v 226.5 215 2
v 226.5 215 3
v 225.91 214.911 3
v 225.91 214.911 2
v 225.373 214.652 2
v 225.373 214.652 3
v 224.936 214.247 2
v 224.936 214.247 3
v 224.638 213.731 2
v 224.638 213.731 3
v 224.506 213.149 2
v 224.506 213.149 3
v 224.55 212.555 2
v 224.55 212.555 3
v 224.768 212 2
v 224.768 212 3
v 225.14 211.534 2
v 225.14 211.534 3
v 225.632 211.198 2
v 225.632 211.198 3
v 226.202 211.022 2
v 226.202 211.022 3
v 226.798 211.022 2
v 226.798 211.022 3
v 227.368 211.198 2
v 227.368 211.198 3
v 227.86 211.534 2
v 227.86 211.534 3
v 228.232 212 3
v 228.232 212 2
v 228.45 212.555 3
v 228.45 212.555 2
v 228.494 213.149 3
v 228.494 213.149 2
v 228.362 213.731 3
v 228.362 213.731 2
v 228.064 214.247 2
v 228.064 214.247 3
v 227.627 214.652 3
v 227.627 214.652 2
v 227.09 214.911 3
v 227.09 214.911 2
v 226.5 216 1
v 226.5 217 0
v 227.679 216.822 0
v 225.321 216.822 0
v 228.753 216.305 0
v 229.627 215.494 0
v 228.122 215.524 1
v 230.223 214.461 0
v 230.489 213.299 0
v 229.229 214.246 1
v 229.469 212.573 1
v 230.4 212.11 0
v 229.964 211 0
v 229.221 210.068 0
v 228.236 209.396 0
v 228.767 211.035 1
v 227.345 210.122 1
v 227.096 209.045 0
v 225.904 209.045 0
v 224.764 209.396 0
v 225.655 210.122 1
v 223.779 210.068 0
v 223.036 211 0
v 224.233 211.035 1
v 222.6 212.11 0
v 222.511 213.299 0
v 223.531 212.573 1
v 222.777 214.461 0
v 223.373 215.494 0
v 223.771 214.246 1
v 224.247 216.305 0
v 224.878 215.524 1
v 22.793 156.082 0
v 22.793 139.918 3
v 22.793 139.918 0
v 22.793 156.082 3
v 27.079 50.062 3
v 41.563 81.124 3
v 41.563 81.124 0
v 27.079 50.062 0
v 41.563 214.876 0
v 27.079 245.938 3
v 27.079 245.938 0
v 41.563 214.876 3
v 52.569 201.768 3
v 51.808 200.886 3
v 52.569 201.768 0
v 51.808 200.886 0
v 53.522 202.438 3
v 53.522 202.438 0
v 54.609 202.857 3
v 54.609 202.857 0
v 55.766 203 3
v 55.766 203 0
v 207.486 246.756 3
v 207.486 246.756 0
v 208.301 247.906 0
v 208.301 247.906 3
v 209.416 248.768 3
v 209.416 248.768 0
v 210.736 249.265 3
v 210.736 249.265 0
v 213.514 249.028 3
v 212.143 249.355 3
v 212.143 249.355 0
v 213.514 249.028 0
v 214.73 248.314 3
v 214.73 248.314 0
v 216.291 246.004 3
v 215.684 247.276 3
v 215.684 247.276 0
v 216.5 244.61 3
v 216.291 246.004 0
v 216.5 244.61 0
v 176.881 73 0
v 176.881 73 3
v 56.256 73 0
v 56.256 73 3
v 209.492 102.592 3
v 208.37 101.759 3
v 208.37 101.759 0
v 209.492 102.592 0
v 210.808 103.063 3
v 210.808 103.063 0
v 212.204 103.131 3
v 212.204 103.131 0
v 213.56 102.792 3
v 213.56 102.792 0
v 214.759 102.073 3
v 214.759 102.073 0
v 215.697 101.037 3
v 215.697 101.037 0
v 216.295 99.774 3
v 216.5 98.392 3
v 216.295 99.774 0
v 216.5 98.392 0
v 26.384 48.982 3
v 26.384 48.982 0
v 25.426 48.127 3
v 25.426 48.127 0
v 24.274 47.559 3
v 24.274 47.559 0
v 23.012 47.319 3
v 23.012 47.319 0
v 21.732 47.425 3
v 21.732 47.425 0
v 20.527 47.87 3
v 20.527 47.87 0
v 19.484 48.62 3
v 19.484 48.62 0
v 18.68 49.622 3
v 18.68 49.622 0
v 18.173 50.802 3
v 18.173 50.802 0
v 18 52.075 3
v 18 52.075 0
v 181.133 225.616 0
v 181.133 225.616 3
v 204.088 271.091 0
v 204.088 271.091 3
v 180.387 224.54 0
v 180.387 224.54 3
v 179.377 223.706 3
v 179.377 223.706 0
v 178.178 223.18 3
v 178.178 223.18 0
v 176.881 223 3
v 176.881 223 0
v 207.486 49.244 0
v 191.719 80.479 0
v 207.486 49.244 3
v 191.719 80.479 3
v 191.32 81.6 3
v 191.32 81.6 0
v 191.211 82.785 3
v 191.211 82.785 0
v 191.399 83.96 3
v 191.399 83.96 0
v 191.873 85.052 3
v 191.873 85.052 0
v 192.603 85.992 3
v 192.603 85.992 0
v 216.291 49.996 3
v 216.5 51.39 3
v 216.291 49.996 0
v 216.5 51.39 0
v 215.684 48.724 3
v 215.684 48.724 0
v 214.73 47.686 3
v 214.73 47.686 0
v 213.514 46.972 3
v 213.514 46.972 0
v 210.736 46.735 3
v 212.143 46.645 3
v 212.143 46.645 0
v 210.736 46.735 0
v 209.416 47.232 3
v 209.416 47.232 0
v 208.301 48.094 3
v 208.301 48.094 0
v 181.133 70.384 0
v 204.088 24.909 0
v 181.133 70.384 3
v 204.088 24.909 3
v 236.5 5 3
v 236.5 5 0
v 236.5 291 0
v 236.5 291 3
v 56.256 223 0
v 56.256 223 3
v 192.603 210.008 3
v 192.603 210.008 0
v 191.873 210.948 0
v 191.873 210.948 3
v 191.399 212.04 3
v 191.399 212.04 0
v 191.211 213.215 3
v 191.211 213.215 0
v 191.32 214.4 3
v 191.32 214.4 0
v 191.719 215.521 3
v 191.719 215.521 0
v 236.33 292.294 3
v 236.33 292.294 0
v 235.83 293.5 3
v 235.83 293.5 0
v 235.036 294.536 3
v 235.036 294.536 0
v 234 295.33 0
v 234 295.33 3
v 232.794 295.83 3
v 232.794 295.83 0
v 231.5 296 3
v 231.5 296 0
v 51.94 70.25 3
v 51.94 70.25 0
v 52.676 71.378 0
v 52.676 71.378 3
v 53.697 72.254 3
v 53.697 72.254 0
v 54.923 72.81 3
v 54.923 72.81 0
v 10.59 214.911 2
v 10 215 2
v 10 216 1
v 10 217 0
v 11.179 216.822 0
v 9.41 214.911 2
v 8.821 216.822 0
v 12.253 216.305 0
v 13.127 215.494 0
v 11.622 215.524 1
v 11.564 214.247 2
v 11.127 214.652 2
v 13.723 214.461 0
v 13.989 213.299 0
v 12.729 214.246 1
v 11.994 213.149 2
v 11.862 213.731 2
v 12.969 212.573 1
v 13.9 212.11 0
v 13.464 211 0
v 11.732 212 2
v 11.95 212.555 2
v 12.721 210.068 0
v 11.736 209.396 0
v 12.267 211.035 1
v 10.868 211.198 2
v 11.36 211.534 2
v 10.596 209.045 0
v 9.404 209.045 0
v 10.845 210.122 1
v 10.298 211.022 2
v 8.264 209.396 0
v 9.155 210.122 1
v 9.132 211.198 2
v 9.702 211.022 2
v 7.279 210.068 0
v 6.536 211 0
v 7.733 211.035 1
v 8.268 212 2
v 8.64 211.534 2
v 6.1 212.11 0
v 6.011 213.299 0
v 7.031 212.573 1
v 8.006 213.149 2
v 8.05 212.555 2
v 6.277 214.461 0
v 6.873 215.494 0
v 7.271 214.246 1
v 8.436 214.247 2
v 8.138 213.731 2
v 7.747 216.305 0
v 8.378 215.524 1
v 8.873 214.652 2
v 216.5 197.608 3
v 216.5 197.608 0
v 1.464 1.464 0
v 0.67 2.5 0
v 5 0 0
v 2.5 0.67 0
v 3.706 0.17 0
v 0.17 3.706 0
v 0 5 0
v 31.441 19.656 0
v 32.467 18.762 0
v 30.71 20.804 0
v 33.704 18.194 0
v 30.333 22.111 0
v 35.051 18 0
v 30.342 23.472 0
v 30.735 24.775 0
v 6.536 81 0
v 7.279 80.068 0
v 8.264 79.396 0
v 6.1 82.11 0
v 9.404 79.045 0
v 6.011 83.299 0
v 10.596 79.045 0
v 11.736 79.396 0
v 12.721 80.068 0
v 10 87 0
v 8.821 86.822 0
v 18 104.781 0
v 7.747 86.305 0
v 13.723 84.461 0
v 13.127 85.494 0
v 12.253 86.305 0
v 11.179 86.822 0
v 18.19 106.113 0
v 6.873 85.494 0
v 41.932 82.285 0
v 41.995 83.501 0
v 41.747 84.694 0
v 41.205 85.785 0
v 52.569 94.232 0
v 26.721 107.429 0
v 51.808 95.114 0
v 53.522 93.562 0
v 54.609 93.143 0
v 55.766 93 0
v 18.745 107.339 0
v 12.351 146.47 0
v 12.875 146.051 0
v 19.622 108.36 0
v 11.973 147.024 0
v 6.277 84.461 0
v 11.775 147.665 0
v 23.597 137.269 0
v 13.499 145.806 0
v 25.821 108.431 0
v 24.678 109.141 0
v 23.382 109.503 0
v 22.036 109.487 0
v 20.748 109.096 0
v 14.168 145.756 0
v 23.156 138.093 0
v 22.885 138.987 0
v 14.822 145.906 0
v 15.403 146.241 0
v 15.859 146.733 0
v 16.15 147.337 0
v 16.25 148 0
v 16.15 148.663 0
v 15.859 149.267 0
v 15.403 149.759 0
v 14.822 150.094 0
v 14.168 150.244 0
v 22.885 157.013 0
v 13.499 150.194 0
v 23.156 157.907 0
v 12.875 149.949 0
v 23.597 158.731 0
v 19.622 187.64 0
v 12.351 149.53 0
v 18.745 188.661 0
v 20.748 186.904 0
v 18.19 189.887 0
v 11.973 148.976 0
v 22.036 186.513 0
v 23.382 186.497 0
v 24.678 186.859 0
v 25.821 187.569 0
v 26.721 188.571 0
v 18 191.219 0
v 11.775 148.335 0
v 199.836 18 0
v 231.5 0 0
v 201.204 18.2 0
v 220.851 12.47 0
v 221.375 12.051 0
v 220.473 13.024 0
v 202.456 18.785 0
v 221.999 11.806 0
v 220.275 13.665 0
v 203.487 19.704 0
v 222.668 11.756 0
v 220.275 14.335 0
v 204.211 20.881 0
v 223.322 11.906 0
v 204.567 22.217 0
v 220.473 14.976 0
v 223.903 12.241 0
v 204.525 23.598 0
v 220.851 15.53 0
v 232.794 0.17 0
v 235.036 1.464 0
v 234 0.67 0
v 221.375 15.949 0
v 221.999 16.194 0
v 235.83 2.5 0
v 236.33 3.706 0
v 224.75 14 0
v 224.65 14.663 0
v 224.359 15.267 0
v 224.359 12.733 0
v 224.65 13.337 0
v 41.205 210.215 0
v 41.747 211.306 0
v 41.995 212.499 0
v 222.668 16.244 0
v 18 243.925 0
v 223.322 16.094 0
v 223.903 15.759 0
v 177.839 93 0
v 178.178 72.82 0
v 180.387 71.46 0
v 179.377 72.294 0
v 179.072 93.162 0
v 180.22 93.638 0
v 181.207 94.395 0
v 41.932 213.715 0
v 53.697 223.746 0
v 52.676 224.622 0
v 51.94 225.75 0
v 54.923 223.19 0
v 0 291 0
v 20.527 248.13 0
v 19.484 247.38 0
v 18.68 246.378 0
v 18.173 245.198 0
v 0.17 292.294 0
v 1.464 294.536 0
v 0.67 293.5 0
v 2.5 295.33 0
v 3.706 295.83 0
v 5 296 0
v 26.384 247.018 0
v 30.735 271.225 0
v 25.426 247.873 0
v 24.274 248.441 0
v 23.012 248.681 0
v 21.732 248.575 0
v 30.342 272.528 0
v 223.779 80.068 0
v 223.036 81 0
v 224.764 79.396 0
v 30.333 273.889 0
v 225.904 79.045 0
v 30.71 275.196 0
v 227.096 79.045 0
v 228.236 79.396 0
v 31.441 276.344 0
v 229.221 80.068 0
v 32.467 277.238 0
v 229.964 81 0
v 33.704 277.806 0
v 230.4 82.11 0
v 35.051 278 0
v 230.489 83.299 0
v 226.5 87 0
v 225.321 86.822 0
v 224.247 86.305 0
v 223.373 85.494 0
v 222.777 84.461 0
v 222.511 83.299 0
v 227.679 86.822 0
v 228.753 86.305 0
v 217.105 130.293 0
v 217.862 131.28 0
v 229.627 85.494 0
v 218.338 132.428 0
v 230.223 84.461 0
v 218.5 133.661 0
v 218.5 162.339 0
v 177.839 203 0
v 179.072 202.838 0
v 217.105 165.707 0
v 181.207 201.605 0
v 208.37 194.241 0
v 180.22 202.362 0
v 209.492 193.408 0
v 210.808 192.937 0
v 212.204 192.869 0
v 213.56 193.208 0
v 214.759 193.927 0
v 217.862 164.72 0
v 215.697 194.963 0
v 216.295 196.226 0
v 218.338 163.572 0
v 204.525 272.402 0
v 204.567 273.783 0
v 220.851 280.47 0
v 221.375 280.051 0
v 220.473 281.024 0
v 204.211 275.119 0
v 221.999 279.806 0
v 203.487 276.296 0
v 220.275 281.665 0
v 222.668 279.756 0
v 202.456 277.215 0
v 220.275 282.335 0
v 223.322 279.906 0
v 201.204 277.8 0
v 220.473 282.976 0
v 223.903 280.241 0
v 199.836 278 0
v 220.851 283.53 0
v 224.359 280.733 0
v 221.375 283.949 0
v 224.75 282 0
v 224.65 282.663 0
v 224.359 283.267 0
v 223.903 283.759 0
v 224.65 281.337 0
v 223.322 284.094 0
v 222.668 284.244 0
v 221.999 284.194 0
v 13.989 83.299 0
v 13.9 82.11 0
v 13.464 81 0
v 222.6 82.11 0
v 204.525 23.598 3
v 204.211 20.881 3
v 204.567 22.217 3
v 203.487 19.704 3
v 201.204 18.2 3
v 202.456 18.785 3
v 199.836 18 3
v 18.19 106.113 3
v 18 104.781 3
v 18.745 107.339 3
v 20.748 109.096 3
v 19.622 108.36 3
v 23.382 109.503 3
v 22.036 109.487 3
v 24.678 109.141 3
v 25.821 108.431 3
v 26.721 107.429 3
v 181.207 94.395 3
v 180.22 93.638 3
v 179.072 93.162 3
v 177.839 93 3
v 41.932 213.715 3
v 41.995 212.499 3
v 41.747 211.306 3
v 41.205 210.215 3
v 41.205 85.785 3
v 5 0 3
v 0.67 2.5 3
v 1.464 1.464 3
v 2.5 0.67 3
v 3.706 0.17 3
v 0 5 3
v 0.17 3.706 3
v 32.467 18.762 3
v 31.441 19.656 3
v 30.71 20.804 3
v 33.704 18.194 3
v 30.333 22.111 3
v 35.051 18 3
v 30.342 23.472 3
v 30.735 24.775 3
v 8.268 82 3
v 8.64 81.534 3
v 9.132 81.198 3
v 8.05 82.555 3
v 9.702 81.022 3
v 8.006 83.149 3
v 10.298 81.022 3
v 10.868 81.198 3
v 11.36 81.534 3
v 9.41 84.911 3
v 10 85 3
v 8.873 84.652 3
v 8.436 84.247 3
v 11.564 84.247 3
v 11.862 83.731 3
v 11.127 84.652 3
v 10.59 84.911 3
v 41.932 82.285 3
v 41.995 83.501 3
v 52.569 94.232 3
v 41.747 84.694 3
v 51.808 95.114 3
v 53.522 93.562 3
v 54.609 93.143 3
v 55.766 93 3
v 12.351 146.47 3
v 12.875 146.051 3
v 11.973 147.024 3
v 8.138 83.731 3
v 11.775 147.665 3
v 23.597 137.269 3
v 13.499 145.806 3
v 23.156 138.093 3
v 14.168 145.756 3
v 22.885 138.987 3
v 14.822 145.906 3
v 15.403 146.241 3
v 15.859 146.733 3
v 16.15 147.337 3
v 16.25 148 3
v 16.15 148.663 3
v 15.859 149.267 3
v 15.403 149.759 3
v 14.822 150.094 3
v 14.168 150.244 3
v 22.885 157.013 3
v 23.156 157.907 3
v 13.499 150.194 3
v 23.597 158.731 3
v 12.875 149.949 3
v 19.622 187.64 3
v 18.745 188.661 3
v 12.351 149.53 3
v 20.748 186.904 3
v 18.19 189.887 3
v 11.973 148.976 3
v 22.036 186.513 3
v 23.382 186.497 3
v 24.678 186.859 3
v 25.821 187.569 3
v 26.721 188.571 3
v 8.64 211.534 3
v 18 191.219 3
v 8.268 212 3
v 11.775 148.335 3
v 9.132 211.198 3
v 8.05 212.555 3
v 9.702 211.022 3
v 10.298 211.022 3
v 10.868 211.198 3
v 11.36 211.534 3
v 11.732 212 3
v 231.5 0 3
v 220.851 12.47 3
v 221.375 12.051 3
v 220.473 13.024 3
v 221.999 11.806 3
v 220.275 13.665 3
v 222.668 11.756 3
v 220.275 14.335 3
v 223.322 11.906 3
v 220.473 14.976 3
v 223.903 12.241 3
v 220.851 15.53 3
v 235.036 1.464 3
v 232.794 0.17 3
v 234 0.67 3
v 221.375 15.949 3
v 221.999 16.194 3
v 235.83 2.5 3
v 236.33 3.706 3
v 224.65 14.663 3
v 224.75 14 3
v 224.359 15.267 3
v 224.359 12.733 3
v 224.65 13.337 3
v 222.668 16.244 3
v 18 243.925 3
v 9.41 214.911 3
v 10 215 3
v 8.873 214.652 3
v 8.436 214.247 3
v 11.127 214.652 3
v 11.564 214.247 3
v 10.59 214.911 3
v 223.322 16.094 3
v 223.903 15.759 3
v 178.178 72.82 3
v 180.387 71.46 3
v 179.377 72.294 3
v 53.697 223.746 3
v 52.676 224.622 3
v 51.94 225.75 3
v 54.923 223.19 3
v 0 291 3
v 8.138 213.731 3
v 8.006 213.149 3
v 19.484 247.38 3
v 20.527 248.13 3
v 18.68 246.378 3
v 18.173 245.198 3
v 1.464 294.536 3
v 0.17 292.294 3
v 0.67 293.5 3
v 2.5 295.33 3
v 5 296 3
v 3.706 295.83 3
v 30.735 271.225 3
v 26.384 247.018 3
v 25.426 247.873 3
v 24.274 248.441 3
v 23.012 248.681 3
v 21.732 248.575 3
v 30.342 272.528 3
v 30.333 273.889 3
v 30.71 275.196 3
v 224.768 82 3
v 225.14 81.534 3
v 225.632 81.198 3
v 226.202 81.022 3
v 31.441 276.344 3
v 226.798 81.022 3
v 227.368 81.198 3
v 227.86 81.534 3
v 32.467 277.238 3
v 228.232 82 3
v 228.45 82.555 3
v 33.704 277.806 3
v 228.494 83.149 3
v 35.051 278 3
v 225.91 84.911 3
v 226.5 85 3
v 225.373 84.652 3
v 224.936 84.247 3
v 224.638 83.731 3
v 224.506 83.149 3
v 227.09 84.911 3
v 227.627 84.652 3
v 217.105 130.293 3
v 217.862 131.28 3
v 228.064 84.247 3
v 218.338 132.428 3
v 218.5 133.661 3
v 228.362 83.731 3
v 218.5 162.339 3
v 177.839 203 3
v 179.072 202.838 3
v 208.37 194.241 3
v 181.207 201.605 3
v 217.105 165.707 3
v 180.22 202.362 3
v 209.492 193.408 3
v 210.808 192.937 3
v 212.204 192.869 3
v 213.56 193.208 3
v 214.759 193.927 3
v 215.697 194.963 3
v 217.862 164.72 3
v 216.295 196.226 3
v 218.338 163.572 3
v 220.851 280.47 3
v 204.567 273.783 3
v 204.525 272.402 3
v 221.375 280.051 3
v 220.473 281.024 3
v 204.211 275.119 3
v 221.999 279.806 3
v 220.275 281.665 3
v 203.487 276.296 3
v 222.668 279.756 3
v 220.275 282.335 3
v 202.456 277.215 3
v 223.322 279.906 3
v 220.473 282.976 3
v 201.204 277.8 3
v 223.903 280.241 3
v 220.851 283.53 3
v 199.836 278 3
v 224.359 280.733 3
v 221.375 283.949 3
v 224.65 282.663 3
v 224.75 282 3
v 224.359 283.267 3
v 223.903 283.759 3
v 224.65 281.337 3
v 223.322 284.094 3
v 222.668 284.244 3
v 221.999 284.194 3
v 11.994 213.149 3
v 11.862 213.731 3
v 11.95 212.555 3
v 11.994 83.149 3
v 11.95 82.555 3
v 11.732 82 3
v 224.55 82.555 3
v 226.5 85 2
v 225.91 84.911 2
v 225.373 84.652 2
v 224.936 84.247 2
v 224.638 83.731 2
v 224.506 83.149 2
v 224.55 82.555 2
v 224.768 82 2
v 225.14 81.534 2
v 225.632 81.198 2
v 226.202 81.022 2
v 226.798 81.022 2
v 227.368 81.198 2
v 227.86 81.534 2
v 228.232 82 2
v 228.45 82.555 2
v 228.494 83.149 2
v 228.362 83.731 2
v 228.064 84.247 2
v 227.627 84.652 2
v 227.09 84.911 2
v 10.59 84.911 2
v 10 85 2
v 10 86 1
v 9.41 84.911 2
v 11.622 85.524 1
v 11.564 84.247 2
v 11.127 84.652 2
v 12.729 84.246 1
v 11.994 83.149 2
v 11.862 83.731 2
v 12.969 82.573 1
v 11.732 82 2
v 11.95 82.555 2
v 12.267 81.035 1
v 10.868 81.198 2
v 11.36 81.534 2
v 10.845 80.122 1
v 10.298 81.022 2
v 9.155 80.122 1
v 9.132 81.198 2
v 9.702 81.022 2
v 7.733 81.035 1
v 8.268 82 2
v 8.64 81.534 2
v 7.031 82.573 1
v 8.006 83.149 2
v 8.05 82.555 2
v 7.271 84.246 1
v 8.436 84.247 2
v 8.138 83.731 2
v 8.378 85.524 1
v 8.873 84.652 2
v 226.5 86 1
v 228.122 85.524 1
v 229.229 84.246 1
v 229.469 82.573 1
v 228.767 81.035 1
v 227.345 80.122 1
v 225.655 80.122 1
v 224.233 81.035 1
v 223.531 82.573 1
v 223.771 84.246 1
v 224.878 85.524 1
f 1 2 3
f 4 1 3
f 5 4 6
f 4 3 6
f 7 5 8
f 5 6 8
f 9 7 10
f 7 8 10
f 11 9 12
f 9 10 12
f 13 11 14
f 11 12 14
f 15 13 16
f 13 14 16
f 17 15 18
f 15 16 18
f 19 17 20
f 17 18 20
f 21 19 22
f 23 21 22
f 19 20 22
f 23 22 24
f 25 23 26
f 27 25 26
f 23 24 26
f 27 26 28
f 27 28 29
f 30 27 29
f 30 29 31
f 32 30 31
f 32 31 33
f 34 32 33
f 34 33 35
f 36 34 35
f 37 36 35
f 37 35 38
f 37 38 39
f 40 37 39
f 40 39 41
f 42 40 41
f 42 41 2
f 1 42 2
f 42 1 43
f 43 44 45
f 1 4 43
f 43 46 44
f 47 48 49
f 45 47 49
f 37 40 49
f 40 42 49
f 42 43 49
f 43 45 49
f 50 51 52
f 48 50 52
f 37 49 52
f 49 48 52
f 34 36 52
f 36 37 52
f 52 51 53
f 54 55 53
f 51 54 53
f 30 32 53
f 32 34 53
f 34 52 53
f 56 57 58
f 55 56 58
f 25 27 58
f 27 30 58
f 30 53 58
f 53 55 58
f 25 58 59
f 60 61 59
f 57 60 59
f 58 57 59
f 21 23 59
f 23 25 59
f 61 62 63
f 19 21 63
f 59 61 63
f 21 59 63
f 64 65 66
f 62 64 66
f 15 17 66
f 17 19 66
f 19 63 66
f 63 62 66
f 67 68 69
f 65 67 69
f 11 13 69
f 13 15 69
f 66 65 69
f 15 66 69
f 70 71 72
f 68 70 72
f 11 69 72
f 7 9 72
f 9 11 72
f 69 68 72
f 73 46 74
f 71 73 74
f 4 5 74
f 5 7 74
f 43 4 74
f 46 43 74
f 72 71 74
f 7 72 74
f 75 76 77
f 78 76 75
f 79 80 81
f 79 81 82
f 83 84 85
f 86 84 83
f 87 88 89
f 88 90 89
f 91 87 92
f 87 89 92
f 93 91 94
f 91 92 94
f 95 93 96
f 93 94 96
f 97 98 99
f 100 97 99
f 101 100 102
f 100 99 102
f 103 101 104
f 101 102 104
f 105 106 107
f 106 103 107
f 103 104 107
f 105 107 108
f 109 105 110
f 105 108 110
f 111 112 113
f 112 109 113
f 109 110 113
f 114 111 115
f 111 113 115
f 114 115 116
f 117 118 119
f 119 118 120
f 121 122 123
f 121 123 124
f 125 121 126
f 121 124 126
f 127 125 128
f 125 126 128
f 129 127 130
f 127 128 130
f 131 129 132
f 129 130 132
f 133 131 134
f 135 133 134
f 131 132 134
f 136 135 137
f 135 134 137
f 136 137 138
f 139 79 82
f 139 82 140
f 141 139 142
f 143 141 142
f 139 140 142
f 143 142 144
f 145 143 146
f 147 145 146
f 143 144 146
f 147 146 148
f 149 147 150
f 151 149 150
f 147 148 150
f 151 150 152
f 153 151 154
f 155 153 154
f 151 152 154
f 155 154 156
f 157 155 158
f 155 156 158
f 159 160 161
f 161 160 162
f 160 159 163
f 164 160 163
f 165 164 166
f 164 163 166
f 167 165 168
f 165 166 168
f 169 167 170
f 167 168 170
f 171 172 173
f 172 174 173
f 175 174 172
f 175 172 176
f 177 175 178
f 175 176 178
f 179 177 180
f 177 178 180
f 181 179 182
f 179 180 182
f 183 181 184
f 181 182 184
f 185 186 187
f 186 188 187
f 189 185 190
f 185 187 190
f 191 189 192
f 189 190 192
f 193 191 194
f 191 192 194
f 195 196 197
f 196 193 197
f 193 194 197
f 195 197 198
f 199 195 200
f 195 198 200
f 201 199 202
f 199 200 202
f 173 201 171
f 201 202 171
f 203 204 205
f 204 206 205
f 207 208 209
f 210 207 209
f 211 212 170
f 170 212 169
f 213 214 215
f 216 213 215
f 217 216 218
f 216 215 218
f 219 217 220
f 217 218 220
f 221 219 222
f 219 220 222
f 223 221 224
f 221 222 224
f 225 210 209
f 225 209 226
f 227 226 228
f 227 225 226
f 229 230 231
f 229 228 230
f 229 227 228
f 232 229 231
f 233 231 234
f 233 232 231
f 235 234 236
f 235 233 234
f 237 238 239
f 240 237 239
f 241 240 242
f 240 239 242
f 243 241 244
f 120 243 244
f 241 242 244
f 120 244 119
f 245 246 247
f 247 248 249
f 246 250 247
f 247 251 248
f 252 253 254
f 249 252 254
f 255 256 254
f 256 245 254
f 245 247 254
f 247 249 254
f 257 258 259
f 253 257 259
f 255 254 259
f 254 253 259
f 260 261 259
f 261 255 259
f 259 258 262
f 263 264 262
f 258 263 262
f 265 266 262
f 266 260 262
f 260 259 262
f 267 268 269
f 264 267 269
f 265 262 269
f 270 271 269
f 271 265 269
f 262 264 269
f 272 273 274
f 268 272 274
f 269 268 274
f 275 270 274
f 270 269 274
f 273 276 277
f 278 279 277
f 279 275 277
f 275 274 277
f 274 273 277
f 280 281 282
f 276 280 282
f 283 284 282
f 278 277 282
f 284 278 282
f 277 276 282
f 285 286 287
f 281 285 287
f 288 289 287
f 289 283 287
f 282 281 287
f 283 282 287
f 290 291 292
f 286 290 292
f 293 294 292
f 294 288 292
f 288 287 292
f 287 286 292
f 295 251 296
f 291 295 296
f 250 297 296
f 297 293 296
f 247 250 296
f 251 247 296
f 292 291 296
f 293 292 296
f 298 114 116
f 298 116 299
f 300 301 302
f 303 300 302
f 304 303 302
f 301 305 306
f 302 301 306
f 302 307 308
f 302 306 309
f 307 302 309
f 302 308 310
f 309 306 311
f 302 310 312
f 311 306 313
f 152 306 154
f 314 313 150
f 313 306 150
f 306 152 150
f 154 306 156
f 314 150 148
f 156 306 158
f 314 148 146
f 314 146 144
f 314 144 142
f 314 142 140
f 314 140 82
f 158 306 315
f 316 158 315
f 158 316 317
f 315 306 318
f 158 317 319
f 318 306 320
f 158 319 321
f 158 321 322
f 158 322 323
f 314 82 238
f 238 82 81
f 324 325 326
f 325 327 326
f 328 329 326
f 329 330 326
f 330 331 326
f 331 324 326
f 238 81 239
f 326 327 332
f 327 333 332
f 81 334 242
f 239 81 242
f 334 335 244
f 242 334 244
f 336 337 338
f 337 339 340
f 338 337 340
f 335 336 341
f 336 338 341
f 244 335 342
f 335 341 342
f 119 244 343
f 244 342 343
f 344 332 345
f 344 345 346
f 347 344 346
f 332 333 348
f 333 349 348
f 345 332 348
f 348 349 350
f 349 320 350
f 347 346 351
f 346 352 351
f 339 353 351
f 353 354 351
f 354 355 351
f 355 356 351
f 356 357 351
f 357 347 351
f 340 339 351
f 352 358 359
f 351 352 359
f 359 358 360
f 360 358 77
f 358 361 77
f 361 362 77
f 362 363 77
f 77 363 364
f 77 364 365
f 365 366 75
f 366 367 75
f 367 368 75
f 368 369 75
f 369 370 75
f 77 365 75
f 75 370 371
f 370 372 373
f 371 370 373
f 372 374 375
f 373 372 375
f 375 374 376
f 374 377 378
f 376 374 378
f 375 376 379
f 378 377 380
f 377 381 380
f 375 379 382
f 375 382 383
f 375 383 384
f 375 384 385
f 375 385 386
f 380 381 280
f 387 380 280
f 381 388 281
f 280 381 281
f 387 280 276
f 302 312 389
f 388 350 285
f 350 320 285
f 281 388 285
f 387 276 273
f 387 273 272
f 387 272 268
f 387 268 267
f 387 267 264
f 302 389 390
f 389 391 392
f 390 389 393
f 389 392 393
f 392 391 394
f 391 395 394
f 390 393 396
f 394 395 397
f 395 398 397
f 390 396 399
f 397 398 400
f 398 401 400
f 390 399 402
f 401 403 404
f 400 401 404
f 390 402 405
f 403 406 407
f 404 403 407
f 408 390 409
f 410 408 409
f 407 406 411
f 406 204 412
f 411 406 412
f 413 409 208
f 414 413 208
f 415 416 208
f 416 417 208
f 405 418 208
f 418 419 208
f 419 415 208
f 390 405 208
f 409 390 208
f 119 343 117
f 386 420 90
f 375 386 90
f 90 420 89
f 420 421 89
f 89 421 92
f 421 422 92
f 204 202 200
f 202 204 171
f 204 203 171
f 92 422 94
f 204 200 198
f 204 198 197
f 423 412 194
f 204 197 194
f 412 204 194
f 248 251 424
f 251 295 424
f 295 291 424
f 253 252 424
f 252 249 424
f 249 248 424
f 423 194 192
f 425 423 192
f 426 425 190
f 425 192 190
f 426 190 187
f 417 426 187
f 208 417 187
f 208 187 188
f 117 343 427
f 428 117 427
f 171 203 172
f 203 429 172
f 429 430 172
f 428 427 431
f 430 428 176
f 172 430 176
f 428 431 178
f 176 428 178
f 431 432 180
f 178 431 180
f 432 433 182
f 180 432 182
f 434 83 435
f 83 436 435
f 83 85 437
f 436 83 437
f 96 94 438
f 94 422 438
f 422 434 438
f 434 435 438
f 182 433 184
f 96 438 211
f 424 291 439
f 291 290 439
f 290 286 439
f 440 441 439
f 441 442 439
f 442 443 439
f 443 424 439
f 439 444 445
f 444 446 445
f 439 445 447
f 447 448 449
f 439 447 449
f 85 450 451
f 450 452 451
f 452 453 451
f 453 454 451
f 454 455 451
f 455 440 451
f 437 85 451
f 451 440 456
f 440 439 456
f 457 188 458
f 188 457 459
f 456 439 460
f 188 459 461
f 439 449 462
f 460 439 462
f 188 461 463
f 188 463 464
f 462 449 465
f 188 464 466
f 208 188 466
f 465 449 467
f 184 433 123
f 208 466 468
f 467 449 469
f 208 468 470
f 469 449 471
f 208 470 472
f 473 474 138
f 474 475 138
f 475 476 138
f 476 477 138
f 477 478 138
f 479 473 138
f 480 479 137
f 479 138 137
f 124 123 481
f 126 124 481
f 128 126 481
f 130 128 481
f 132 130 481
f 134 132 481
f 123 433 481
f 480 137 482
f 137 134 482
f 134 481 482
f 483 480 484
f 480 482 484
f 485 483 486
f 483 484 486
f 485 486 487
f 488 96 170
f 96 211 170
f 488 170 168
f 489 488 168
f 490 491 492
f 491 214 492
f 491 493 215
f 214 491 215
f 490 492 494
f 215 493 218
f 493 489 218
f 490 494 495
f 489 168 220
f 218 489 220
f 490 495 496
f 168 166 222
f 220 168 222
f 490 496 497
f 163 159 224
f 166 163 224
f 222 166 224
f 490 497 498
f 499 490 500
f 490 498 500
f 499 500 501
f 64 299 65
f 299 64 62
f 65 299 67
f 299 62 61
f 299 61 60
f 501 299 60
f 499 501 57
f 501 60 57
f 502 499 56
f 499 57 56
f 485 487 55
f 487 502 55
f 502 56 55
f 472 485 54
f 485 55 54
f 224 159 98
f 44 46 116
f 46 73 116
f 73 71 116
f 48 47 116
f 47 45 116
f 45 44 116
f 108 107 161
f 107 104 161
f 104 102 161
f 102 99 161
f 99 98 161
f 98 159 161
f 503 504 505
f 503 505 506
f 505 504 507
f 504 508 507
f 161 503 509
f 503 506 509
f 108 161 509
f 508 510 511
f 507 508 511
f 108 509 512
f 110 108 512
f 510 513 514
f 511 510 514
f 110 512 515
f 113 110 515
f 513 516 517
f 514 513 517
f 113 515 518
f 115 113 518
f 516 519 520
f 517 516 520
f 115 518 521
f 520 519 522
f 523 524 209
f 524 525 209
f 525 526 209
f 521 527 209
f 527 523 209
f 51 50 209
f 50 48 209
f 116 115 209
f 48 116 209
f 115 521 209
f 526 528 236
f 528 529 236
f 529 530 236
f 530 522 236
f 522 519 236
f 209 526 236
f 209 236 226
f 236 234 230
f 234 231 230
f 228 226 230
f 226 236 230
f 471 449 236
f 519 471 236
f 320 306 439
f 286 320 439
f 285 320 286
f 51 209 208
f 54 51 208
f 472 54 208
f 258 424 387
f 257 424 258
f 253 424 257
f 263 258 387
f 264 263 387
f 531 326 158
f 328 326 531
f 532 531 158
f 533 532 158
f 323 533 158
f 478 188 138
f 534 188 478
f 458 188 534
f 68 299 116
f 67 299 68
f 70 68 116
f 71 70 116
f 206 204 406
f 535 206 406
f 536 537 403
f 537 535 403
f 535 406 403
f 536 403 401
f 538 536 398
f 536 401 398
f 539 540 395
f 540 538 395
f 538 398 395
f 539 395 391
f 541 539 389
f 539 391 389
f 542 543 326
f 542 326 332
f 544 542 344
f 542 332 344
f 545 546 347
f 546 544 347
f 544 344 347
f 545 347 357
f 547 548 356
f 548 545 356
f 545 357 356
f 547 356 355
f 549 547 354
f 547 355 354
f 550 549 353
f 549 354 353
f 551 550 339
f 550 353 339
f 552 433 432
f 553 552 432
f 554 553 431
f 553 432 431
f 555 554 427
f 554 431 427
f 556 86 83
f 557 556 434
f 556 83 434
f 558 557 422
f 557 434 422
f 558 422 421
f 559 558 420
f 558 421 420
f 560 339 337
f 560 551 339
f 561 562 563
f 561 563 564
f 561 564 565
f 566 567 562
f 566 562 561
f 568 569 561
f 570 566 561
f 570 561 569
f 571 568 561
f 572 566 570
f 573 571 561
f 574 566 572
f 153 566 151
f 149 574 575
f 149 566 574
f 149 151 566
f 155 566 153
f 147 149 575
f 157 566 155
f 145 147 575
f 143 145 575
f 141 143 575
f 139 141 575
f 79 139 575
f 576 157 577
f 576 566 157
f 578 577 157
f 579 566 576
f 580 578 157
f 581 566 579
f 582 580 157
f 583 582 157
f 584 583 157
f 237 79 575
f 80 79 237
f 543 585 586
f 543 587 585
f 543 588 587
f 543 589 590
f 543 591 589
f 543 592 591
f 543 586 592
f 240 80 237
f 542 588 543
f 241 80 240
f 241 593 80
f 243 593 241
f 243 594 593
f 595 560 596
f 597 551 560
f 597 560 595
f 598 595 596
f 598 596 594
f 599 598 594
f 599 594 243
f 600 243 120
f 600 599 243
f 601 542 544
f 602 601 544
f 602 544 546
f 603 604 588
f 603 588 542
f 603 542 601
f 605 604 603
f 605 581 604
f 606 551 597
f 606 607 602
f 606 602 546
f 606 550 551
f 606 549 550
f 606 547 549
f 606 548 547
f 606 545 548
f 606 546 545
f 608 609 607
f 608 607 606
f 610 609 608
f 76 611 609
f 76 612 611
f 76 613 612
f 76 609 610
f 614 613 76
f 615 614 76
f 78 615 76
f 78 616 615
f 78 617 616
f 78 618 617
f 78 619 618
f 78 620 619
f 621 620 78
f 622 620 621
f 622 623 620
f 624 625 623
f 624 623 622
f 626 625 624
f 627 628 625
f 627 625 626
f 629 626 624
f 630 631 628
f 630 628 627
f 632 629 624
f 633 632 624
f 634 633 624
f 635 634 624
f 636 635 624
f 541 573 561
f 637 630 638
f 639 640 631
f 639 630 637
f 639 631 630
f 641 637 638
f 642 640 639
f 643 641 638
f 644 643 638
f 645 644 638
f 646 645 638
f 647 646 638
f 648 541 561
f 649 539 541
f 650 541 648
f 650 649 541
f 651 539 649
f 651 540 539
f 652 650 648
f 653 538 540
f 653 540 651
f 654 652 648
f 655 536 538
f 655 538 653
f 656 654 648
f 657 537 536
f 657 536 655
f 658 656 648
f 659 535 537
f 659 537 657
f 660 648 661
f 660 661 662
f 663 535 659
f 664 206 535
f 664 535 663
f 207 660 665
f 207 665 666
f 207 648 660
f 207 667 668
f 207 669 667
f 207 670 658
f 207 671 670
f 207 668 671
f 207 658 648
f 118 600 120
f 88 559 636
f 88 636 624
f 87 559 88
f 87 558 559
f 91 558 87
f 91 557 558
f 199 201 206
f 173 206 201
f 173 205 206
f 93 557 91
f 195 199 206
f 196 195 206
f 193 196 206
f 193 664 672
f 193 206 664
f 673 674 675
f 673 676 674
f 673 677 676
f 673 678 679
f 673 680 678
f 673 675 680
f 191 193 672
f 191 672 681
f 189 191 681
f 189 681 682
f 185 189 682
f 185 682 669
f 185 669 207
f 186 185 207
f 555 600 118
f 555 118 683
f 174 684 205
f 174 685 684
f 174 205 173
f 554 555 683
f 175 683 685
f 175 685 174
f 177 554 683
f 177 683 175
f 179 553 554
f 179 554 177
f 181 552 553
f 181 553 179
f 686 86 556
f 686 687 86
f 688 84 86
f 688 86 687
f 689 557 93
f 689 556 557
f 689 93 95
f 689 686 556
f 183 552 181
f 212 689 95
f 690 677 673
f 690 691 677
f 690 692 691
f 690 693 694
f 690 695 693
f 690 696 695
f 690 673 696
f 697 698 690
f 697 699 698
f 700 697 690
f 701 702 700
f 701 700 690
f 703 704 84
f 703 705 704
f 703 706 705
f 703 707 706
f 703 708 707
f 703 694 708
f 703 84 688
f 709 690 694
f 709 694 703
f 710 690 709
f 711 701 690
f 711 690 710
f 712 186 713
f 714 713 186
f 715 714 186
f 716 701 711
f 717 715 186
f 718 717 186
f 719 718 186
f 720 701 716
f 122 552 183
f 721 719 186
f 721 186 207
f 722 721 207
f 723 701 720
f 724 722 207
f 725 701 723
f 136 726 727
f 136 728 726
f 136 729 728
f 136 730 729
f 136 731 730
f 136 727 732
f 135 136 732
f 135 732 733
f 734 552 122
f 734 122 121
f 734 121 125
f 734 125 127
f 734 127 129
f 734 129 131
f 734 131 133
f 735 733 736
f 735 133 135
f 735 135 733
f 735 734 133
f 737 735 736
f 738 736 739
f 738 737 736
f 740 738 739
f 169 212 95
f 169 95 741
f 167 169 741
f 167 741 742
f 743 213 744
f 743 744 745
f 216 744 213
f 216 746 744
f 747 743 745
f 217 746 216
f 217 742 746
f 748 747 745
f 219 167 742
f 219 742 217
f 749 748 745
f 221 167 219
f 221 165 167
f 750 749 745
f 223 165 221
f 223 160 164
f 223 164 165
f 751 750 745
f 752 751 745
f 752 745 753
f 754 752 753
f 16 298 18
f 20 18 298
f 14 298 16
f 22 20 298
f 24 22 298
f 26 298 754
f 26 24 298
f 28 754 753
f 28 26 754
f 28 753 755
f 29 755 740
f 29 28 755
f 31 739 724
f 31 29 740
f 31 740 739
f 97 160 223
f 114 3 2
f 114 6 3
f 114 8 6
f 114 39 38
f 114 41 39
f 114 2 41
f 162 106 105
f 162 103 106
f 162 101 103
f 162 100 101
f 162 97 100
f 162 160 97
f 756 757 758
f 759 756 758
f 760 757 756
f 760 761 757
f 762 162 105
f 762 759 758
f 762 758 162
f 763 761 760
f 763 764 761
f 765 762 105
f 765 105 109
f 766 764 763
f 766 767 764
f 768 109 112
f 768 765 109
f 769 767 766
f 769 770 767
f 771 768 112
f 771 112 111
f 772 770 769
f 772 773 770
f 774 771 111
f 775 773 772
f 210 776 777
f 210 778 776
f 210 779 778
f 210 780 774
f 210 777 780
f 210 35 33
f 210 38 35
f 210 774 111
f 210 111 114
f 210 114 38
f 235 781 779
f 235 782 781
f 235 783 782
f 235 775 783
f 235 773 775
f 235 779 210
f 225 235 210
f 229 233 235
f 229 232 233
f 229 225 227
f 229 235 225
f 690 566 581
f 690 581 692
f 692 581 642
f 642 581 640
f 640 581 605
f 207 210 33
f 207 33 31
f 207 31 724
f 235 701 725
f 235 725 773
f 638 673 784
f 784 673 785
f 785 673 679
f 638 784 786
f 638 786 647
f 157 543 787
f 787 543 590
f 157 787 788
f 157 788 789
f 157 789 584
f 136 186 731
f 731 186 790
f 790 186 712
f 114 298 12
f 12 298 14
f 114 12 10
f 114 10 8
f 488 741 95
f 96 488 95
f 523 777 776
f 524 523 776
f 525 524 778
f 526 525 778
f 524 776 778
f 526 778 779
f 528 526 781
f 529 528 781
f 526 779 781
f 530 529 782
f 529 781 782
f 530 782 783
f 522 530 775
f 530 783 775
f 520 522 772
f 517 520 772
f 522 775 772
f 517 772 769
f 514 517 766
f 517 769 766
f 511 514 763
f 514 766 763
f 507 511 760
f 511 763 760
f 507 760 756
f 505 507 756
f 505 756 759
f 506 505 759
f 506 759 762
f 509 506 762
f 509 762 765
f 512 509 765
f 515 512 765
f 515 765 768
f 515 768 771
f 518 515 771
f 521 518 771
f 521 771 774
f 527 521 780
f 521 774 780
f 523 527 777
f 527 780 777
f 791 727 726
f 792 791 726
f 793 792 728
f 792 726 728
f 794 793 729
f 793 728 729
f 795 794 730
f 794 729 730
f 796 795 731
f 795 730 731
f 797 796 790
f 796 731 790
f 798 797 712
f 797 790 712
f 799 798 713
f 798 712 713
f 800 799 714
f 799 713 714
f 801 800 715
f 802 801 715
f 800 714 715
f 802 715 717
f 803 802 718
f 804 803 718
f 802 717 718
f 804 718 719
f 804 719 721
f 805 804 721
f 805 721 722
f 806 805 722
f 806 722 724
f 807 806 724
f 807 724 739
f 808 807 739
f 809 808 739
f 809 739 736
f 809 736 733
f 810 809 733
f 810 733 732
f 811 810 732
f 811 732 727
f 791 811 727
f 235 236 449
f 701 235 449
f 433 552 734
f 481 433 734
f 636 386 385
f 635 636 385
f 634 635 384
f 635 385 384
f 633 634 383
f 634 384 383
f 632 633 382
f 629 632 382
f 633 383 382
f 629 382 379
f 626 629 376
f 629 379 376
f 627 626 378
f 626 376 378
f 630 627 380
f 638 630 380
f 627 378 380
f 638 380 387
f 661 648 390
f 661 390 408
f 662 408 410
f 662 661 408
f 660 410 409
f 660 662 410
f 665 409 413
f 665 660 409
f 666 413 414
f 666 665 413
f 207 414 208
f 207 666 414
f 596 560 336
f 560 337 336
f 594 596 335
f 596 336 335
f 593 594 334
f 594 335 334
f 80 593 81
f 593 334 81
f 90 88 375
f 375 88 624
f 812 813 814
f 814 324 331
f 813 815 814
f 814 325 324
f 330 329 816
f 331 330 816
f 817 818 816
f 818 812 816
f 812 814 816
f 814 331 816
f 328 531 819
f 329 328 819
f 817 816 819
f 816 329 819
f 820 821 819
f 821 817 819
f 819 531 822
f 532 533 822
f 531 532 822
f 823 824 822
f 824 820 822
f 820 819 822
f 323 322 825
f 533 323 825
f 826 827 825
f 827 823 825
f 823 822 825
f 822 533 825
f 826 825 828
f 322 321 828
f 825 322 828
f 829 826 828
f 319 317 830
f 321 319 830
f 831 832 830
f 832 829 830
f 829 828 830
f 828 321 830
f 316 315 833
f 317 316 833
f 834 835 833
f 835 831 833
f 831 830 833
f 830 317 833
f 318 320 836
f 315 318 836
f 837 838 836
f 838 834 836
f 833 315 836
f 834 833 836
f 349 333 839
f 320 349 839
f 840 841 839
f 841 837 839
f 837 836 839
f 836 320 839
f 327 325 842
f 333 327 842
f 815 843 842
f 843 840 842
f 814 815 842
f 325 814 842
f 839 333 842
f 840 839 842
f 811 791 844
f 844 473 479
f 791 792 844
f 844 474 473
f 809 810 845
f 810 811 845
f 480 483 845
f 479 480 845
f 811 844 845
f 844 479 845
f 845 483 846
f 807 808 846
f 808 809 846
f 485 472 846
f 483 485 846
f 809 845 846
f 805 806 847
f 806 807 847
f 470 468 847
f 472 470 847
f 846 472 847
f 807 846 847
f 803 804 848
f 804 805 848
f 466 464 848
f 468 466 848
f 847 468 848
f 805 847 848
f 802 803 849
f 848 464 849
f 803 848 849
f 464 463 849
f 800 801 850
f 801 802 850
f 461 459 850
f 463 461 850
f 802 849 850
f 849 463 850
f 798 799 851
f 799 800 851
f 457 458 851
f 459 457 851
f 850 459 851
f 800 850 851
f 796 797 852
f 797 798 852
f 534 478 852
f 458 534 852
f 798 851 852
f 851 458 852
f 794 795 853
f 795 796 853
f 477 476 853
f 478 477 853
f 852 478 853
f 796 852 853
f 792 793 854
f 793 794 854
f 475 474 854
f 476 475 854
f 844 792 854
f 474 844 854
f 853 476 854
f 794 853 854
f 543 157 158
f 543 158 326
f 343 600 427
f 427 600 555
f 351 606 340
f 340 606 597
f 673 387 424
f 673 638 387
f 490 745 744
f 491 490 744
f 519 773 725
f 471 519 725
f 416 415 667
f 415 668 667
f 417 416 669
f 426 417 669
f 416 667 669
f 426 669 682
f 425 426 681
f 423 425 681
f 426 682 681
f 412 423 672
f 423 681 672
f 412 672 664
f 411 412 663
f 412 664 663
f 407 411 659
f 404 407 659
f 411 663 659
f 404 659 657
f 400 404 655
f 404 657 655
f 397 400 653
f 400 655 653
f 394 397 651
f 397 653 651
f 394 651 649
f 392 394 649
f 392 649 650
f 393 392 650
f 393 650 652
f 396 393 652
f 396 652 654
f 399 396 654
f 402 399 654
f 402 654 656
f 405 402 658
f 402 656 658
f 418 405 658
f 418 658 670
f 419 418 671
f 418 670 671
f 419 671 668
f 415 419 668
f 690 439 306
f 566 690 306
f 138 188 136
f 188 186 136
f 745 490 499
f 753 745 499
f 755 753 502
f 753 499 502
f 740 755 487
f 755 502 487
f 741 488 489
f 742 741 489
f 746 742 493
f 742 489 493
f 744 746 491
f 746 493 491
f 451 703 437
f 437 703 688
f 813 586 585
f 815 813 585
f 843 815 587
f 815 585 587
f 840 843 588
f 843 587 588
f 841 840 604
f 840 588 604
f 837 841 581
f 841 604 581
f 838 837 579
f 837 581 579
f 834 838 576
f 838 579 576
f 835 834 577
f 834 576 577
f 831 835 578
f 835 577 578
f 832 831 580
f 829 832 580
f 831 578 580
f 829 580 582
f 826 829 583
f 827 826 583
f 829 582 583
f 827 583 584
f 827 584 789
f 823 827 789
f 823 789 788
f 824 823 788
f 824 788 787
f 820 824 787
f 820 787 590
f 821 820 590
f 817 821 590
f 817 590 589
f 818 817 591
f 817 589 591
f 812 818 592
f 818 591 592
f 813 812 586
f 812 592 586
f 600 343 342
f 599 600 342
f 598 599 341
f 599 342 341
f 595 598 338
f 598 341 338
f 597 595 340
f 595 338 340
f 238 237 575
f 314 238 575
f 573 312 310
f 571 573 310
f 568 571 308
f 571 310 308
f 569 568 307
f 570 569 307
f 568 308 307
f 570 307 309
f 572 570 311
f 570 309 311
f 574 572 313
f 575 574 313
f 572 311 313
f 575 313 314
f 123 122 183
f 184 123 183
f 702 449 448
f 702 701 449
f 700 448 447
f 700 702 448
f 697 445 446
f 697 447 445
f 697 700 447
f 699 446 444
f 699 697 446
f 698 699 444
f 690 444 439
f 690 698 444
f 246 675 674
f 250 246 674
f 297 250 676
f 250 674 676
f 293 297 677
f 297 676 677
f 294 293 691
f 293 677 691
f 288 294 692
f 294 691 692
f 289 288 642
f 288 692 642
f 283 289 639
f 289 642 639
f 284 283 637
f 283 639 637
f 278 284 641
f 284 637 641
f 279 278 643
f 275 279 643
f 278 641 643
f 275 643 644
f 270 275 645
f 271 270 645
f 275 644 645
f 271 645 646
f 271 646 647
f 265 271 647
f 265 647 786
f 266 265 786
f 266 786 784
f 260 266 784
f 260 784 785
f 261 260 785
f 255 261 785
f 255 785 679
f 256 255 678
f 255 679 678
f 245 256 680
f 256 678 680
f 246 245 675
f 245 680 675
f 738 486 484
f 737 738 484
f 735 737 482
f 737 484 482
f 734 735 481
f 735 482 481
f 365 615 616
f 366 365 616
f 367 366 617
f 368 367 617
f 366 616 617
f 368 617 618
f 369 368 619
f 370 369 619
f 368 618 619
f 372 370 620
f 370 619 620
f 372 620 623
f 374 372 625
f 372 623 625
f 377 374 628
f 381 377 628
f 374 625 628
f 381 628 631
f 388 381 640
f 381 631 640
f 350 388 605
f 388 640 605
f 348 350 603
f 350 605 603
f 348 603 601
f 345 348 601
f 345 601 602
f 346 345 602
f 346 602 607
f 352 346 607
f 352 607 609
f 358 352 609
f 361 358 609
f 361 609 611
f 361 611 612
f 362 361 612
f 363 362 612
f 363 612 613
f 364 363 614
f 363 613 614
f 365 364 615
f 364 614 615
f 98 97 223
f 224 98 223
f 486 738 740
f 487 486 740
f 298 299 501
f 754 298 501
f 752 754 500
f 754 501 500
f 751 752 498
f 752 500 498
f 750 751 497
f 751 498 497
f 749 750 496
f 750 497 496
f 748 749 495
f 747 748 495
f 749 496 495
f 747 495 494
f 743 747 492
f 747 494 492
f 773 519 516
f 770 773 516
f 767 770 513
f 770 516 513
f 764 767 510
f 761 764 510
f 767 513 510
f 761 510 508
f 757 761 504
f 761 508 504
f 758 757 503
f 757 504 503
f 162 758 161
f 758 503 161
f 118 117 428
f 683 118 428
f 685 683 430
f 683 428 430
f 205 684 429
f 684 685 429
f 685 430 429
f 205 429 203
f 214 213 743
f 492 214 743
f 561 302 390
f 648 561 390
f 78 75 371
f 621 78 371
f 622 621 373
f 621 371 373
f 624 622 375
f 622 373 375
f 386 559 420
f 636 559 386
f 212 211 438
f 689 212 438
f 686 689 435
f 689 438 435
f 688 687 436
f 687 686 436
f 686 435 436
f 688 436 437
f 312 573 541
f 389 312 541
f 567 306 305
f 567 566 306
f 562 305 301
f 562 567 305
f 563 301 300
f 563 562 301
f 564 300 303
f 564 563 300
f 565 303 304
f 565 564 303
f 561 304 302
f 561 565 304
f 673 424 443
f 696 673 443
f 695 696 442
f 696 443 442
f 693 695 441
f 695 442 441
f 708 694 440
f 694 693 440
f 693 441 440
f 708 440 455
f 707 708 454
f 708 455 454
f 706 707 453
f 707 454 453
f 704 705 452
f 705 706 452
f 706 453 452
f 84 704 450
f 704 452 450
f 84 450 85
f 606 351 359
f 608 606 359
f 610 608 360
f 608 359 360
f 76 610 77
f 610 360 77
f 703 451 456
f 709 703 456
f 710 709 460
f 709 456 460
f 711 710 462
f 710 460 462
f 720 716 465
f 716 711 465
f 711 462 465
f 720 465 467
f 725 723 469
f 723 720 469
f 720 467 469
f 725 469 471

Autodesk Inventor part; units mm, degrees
ref_plane "YZ Plane" through (0, 0, 0) normal (1, 0, 0) x (0, 1, 0)
ref_plane "XZ Plane" through (0, 0, 0) normal (0, 1, 0) x (-1, 0, 0)
ref_plane "XY Plane" through (0, 0, 0) normal (0, 0, 1) x (1, 0, 0)
sketch "Sketch1" plane through (0, 0, 0) normal (0, 0, 1) x (1, 0, 0)
  line L0 (0, 0) -> (236.5, 0)
  line L1 (236.5, 0) -> (236.5, 296)
  line L2 (236.5, 296) -> (0, 296)
  line L3 (0, 296) -> (0, 0)
  dimension "d0" = 236.5
  dimension "d1" = 296
extrude "Extrusion1" add sketch "Sketch1" along normal blind 3
sketch "Sketch2" plane through (0, 0, 3) normal (0, 0, 1) x (1, 0, 0)
  line L0 (0, 0) -> (236.5, 0) projected
  line L1 (236.5, 0) -> (236.5, 296) projected
  line L2 (236.5, 296) -> (0, 296) projected
  line L3 (0, 296) -> (0, 0) projected
  line L4 (207.5752, 278) -> (27.5752, 278)
  line L5 (27.5752, 278) -> (53.2221, 223)
  line L6 (53.2221, 223) -> (179.8118, 223)
  line L7 (179.8118, 223) -> (207.5752, 278)
  line L8 (216.5, 264.6127) -> (190.1661, 212.4446)
  line L9 (190.1661, 212.4446) -> (216.5, 186.1108)
  line L10 (218.5, 164.3118) -> (179.8118, 203)
  line L11 (216.5, 264.6127) -> (216.5, 186.1108)
  line L12 (179.8118, 203) -> (53.2221, 203)
  line L13 (53.2221, 203) -> (22.7929, 157.529)
  line L14 (18, 265.4073) -> (42.6969, 212.4446)
  line L15 (42.6969, 212.4446) -> (18, 175.5396)
  line L16 (18, 175.5396) -> (18, 265.4073)
  line L17 (22.7929, 138.471) -> (53.2221, 93)
  line L18 (53.2221, 93) -> (179.8118, 93)
  line L19 (179.8118, 93) -> (218.5, 131.6882)
  line L20 (218.5, 131.6882) -> (218.5, 164.3118)
  line L21 (216.5, 109.8892) -> (190.1661, 83.5554)
  line L22 (190.1661, 83.5554) -> (216.5, 31.3873)
  line L23 (216.5, 31.3873) -> (216.5, 109.8892)
  line L24 (18, 120.4604) -> (42.6969, 83.5554)
  line L25 (42.6969, 83.5554) -> (18, 30.5927)
  line L26 (18, 30.5927) -> (18, 120.4604)
  line L27 (27.5752, 18) -> (207.5752, 18)
  line L28 (207.5752, 18) -> (179.8118, 73)
  line L29 (179.8118, 73) -> (53.2221, 73)
  line L30 (53.2221, 73) -> (27.5752, 18)
  line L31 (22.7929, 138.471) -> (22.7929, 157.529)
  dimension "d19" = 65
  dimension "d29" = 110
  dimension "d31" = 20
  dimension "d32" = 18
  dimension "d33" = 18
  dimension "d34" = 20
  dimension "d35" = 18
  dimension "d40" = 14
  dimension "d41" = 14
  dimension "d52" = 180
  dimension "d55" = 135
  dimension "d59" = 20
  dimension "d60" = 14
  dimension "d61" = 14
  dimension "d62" = 14
  dimension "d63" = 14
  dimension "d64" = 18
extrude "Extrusion2" cut sketch "Sketch2" against normal up to next contours L7 L6 L5 L4 | L11 L9 L8 | L20 L19 L18 L17 L31 L13 L12 L10 | L14 L15 L16 | L23 L22 L21 | L24 L25 L26 | L30 L29 L28 L27
sketch "Sketch3" plane through (0, 0, 3) normal (0, 0, 1) x (1, 0, 0)
  line L0 (0, 0) -> (236.5, 0) projected
  line L1 (236.5, 0) -> (236.5, 296) projected
  line L2 (236.5, 296) -> (0, 296) projected
  line L3 (0, 296) -> (0, 0) projected
  circle A0 centre (222.5, 282) radius 2.25
  circle A1 centre (14, 148) radius 2.25
  circle A2 centre (222.5, 14) radius 2.25
  dimension "d44" = 4.5
  dimension "d45" = 14
  dimension "d46" = 14
  dimension "d47" = 14
  dimension "d56" = 148
  dimension "d57" = 14
extrude "Extrusion3" cut sketch "Sketch3" against normal up to next contours A0 | A1 | A2
fillet "Fillet1" radius 4.7625 28 edges at (27.5752, 18, 1.5) (207.5752, 18, 1.5) (179.8118, 73, 1.5) (53.2221, 73, 1.5) (18, 30.5927, 1.5) (42.6969, 83.5554, 1.5) (18, 120.4604, 1.5) (42.6969, 212.4446, 1.5) (18, 175.5396, 1.5) (18, 265.4073, 1.5) (27.5752, 278, 1.5) (53.2221, 223, 1.5) (179.8118, 223, 1.5) (207.5752, 278, 1.5) (190.1661, 83.5554, 1.5) (216.5, 31.3873, 1.5) (216.5, 109.8892, 1.5) (216.5, 186.1108, 1.5) (190.1661, 212.4446, 1.5) (216.5, 264.6127, 1.5) (218.5, 131.6882, 1.5) (218.5, 164.3118, 1.5) (179.8118, 93, 1.5) (179.8118, 203, 1.5) (53.2221, 203, 1.5) (22.7929, 157.529, 1.5) (22.7929, 138.471, 1.5) (53.2221, 93, 1.5)
fillet "Fillet2" radius 5 4 edges at (236.5, 0, 1.5) (0, 0, 1.5) (0, 296, 1.5) (236.5, 296, 1.5)
sketch "Sketch4" plane through (0, 0, 0) normal (0, 0, -1) x (-1, 0, 0)
  line L0 (-177.8391, 203) -> (-55.7656, 203) projected
  line L1 (-55.7656, 93) -> (-177.8391, 93) projected
  line L2 (-236.5, 5) -> (-236.5, 291) projected
  line L3 (0, 291) -> (0, 5) projected
  point P0 (0, 0)
  point P1 (-10, 213)
  point P2 (-226.5, 213)
  point P3 (-10, 83)
  point P4 (-226.5, 83)
  dimension "d65" = 10
  dimension "d66" = 10
  dimension "d67" = 10
  dimension "d68" = 10
hole "Hole1" at (10, 213, 0) at (226.5, 213, 0) at (10, 83, 0) at (226.5, 83, 0) direction (0, 0, 1) diameter 4 end through all countersink diameter 8 countersink angle 90
properties part number "ZBedPlate" material "Steel, Alloy"
